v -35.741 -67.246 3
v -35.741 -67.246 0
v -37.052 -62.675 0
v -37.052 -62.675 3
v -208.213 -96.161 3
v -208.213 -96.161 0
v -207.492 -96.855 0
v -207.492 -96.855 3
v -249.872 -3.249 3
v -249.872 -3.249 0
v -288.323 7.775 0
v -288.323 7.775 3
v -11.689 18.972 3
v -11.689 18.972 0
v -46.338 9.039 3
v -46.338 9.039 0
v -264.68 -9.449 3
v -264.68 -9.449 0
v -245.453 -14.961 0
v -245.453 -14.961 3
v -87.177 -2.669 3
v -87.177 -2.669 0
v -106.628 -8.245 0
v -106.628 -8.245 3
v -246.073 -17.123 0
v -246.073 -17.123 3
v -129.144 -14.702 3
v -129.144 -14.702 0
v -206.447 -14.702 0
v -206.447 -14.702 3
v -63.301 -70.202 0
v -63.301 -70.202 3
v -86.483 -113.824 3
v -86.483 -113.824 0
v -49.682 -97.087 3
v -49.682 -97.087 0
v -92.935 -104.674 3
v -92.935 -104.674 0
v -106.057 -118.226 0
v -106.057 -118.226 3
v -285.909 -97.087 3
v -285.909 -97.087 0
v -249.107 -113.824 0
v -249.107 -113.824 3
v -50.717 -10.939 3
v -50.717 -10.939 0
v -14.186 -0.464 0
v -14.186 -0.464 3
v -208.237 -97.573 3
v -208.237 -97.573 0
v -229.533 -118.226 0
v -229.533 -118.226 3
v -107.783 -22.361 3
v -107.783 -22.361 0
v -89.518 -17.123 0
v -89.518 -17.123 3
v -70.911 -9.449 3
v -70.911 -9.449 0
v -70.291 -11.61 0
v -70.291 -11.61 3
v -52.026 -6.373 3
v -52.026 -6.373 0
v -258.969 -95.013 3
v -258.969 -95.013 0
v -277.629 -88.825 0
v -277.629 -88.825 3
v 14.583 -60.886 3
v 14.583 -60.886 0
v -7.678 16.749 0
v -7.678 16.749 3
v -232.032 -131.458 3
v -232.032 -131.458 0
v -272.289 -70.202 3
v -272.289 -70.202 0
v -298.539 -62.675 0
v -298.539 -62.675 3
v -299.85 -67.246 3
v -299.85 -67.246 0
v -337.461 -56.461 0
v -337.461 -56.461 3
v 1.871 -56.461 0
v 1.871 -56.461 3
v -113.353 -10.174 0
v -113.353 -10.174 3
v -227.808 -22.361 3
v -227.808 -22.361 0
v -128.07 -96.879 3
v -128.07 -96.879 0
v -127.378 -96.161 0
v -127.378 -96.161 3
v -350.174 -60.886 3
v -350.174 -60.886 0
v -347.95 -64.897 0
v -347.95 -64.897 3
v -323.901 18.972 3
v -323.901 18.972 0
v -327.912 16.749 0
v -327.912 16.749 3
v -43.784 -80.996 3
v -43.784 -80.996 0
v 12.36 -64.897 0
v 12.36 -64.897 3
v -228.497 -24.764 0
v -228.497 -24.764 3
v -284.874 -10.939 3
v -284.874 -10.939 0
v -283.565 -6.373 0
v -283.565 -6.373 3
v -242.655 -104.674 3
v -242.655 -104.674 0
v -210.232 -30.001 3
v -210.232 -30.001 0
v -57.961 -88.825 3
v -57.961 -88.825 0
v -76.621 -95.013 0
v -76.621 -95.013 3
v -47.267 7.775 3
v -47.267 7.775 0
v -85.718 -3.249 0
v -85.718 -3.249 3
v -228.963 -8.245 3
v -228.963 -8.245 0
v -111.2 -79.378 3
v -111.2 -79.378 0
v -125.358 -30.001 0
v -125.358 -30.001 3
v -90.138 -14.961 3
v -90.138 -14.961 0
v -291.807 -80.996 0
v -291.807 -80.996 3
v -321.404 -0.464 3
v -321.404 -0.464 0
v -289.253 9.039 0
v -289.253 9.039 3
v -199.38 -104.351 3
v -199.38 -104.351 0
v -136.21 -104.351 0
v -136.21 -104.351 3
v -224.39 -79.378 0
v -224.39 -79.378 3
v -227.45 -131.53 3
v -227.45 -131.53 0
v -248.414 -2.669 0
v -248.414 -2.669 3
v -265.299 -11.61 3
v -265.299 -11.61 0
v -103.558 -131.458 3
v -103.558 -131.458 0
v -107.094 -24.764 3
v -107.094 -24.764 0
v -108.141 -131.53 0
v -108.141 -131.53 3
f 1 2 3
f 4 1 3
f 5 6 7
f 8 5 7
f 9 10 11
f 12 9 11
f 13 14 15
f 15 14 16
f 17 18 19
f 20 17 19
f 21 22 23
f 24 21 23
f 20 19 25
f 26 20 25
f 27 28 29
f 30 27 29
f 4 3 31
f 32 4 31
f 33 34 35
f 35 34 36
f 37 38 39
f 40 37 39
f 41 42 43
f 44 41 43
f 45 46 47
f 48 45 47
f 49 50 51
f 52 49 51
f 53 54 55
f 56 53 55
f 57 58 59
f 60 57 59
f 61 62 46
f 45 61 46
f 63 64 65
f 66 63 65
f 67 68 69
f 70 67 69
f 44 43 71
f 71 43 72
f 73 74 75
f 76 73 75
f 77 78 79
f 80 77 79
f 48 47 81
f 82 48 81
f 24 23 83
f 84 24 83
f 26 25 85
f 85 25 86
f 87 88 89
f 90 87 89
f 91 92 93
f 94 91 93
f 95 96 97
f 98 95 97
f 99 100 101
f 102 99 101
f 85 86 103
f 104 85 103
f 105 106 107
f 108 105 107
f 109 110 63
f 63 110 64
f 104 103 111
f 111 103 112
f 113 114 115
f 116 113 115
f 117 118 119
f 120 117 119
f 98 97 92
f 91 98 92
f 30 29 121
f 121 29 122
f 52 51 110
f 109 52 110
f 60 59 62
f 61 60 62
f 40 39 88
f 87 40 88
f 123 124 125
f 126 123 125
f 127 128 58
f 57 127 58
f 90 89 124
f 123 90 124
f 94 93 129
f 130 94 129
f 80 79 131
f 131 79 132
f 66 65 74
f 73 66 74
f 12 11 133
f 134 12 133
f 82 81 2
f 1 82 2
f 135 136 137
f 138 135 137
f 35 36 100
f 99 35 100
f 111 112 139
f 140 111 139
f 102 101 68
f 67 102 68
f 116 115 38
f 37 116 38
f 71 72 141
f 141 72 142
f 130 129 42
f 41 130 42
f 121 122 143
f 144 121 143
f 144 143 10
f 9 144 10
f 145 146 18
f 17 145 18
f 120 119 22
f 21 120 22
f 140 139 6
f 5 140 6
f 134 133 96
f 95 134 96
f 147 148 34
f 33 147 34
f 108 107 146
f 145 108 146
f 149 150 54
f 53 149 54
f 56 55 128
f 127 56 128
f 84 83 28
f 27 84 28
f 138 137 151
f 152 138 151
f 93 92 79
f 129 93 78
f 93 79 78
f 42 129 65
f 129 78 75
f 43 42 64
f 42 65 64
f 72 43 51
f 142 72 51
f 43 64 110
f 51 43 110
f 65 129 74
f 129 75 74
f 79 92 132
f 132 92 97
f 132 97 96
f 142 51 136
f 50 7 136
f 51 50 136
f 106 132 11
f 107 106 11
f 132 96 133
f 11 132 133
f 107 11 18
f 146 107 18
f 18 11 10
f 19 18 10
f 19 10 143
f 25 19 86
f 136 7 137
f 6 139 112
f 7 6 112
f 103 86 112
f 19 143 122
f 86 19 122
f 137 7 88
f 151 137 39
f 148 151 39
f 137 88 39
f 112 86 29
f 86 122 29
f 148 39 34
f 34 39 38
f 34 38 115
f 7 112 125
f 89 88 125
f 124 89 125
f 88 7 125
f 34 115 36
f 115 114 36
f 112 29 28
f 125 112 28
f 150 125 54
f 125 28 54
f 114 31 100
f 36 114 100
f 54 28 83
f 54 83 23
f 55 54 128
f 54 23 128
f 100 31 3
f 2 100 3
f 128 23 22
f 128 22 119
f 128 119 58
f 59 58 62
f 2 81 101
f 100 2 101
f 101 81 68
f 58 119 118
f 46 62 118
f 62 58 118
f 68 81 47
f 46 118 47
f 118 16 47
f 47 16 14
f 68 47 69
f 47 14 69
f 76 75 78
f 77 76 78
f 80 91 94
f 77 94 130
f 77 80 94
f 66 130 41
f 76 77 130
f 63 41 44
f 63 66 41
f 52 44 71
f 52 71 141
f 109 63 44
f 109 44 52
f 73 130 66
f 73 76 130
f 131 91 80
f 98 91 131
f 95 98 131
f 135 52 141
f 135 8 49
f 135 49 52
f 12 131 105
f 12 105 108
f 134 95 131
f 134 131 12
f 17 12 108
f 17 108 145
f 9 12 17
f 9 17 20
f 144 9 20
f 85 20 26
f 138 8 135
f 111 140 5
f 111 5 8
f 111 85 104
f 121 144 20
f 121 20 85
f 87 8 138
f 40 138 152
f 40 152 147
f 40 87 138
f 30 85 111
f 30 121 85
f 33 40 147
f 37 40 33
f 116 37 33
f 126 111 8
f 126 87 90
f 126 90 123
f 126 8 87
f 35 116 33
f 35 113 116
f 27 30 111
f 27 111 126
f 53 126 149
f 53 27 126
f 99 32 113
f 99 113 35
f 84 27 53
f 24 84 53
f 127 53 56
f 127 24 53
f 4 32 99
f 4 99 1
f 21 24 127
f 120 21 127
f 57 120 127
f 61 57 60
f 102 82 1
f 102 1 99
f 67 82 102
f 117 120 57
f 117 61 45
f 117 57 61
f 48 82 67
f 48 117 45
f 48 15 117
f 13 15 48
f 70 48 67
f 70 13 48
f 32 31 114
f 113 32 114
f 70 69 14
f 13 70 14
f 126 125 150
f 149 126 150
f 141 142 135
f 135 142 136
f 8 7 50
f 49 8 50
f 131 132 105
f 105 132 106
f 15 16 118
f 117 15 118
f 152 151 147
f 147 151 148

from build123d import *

# Parameters (mm, degrees)
BOSS_EXTRU_1_DEPTH = 3


with BuildPart() as part:
    # Esquisse1 → Boss.-Extru.1 (new body)
    with BuildSketch(Plane.XY):
        Polygon((-113.35310374, -10.173637327), (-129.143746737, -14.701531345), (-206.446773007, -14.701531345), (-222.237416003, -10.173637327), (-228.962816583, -8.245159743), (-248.413999189, -2.668793647), (-249.872259625, -3.248768002), (-288.323340616, 7.774587685), (-289.252816682, 9.039090747), (-323.901077775, 18.972234266), (-327.912092601, 16.748746626), (-350.173506381, -60.88602933), (-347.950273, -64.896848521), (-291.80662177, -80.995781451), (-285.908889082, -97.08692424), (-249.107067355, -113.823629959), (-232.032352152, -131.457901649), (-227.449883961, -131.529994355), (-199.380152195, -104.350948678), (-136.210367548, -104.350948678), (-108.140635782, -131.529994355), (-103.558167591, -131.457901649), (-86.483452388, -113.823629959), (-49.681630661, -97.08692424), (-43.783897973, -80.995781451), (12.359753257, -64.896848521), (14.582986638, -60.88602933), (-7.678427142, 16.748746626), (-11.689441968, 18.972234266), (-46.337703061, 9.039090747), (-47.267179127, 7.774587685), (-85.718260118, -3.248768002), (-87.176520554, -2.668793647), (-106.62770316, -8.245159743), align=None)
        Polygon((-210.232188047, -30.001147656), (-224.390430785, -79.377961929), (-208.212806214, -96.161100182), (-207.491865187, -96.85509979), (-208.236606037, -97.572971364), (-229.533063287, -118.225792128), (-242.655085998, -104.673746846), (-258.969310369, -95.012679745), (-277.629290011, -88.825419148), (-272.289144354, -70.202118055), (-298.538981418, -62.6750984), (-299.849714513, -67.246167925), (-337.461409717, -56.461187875), (-321.404434006, -0.463858857), (-284.873898651, -10.938821309), (-283.564528345, -6.372504389), (-265.299260667, -11.609985616), (-264.679553884, -9.448811229), (-245.452786066, -14.960840928), (-246.072799476, -17.123084647), (-227.807531798, -22.360565873), (-228.496674065, -24.763890567), align=None, mode=Mode.SUBTRACT)
        Polygon((-106.057456456, -118.225792128), (-128.0696158, -96.878899722), (-127.377713529, -96.161100182), (-111.200088958, -79.377961929), (-125.358331696, -30.001147656), (-107.093845678, -24.763890567), (-107.782987945, -22.360565873), (-89.517720268, -17.123084647), (-90.137733677, -14.960840928), (-70.910965859, -9.448811229), (-70.291259076, -11.609985616), (-52.025991399, -6.372504389), (-50.716621092, -10.938821309), (-14.186085737, -0.463858857), (1.870889973, -56.461187875), (-35.740805231, -67.246167925), (-37.051538325, -62.6750984), (-63.301375389, -70.202118055), (-57.961229733, -88.825419148), (-76.621209374, -95.012679745), (-92.935433745, -104.673746846), align=None, mode=Mode.SUBTRACT)
    extrude(amount=BOSS_EXTRU_1_DEPTH)


solid = part.part
